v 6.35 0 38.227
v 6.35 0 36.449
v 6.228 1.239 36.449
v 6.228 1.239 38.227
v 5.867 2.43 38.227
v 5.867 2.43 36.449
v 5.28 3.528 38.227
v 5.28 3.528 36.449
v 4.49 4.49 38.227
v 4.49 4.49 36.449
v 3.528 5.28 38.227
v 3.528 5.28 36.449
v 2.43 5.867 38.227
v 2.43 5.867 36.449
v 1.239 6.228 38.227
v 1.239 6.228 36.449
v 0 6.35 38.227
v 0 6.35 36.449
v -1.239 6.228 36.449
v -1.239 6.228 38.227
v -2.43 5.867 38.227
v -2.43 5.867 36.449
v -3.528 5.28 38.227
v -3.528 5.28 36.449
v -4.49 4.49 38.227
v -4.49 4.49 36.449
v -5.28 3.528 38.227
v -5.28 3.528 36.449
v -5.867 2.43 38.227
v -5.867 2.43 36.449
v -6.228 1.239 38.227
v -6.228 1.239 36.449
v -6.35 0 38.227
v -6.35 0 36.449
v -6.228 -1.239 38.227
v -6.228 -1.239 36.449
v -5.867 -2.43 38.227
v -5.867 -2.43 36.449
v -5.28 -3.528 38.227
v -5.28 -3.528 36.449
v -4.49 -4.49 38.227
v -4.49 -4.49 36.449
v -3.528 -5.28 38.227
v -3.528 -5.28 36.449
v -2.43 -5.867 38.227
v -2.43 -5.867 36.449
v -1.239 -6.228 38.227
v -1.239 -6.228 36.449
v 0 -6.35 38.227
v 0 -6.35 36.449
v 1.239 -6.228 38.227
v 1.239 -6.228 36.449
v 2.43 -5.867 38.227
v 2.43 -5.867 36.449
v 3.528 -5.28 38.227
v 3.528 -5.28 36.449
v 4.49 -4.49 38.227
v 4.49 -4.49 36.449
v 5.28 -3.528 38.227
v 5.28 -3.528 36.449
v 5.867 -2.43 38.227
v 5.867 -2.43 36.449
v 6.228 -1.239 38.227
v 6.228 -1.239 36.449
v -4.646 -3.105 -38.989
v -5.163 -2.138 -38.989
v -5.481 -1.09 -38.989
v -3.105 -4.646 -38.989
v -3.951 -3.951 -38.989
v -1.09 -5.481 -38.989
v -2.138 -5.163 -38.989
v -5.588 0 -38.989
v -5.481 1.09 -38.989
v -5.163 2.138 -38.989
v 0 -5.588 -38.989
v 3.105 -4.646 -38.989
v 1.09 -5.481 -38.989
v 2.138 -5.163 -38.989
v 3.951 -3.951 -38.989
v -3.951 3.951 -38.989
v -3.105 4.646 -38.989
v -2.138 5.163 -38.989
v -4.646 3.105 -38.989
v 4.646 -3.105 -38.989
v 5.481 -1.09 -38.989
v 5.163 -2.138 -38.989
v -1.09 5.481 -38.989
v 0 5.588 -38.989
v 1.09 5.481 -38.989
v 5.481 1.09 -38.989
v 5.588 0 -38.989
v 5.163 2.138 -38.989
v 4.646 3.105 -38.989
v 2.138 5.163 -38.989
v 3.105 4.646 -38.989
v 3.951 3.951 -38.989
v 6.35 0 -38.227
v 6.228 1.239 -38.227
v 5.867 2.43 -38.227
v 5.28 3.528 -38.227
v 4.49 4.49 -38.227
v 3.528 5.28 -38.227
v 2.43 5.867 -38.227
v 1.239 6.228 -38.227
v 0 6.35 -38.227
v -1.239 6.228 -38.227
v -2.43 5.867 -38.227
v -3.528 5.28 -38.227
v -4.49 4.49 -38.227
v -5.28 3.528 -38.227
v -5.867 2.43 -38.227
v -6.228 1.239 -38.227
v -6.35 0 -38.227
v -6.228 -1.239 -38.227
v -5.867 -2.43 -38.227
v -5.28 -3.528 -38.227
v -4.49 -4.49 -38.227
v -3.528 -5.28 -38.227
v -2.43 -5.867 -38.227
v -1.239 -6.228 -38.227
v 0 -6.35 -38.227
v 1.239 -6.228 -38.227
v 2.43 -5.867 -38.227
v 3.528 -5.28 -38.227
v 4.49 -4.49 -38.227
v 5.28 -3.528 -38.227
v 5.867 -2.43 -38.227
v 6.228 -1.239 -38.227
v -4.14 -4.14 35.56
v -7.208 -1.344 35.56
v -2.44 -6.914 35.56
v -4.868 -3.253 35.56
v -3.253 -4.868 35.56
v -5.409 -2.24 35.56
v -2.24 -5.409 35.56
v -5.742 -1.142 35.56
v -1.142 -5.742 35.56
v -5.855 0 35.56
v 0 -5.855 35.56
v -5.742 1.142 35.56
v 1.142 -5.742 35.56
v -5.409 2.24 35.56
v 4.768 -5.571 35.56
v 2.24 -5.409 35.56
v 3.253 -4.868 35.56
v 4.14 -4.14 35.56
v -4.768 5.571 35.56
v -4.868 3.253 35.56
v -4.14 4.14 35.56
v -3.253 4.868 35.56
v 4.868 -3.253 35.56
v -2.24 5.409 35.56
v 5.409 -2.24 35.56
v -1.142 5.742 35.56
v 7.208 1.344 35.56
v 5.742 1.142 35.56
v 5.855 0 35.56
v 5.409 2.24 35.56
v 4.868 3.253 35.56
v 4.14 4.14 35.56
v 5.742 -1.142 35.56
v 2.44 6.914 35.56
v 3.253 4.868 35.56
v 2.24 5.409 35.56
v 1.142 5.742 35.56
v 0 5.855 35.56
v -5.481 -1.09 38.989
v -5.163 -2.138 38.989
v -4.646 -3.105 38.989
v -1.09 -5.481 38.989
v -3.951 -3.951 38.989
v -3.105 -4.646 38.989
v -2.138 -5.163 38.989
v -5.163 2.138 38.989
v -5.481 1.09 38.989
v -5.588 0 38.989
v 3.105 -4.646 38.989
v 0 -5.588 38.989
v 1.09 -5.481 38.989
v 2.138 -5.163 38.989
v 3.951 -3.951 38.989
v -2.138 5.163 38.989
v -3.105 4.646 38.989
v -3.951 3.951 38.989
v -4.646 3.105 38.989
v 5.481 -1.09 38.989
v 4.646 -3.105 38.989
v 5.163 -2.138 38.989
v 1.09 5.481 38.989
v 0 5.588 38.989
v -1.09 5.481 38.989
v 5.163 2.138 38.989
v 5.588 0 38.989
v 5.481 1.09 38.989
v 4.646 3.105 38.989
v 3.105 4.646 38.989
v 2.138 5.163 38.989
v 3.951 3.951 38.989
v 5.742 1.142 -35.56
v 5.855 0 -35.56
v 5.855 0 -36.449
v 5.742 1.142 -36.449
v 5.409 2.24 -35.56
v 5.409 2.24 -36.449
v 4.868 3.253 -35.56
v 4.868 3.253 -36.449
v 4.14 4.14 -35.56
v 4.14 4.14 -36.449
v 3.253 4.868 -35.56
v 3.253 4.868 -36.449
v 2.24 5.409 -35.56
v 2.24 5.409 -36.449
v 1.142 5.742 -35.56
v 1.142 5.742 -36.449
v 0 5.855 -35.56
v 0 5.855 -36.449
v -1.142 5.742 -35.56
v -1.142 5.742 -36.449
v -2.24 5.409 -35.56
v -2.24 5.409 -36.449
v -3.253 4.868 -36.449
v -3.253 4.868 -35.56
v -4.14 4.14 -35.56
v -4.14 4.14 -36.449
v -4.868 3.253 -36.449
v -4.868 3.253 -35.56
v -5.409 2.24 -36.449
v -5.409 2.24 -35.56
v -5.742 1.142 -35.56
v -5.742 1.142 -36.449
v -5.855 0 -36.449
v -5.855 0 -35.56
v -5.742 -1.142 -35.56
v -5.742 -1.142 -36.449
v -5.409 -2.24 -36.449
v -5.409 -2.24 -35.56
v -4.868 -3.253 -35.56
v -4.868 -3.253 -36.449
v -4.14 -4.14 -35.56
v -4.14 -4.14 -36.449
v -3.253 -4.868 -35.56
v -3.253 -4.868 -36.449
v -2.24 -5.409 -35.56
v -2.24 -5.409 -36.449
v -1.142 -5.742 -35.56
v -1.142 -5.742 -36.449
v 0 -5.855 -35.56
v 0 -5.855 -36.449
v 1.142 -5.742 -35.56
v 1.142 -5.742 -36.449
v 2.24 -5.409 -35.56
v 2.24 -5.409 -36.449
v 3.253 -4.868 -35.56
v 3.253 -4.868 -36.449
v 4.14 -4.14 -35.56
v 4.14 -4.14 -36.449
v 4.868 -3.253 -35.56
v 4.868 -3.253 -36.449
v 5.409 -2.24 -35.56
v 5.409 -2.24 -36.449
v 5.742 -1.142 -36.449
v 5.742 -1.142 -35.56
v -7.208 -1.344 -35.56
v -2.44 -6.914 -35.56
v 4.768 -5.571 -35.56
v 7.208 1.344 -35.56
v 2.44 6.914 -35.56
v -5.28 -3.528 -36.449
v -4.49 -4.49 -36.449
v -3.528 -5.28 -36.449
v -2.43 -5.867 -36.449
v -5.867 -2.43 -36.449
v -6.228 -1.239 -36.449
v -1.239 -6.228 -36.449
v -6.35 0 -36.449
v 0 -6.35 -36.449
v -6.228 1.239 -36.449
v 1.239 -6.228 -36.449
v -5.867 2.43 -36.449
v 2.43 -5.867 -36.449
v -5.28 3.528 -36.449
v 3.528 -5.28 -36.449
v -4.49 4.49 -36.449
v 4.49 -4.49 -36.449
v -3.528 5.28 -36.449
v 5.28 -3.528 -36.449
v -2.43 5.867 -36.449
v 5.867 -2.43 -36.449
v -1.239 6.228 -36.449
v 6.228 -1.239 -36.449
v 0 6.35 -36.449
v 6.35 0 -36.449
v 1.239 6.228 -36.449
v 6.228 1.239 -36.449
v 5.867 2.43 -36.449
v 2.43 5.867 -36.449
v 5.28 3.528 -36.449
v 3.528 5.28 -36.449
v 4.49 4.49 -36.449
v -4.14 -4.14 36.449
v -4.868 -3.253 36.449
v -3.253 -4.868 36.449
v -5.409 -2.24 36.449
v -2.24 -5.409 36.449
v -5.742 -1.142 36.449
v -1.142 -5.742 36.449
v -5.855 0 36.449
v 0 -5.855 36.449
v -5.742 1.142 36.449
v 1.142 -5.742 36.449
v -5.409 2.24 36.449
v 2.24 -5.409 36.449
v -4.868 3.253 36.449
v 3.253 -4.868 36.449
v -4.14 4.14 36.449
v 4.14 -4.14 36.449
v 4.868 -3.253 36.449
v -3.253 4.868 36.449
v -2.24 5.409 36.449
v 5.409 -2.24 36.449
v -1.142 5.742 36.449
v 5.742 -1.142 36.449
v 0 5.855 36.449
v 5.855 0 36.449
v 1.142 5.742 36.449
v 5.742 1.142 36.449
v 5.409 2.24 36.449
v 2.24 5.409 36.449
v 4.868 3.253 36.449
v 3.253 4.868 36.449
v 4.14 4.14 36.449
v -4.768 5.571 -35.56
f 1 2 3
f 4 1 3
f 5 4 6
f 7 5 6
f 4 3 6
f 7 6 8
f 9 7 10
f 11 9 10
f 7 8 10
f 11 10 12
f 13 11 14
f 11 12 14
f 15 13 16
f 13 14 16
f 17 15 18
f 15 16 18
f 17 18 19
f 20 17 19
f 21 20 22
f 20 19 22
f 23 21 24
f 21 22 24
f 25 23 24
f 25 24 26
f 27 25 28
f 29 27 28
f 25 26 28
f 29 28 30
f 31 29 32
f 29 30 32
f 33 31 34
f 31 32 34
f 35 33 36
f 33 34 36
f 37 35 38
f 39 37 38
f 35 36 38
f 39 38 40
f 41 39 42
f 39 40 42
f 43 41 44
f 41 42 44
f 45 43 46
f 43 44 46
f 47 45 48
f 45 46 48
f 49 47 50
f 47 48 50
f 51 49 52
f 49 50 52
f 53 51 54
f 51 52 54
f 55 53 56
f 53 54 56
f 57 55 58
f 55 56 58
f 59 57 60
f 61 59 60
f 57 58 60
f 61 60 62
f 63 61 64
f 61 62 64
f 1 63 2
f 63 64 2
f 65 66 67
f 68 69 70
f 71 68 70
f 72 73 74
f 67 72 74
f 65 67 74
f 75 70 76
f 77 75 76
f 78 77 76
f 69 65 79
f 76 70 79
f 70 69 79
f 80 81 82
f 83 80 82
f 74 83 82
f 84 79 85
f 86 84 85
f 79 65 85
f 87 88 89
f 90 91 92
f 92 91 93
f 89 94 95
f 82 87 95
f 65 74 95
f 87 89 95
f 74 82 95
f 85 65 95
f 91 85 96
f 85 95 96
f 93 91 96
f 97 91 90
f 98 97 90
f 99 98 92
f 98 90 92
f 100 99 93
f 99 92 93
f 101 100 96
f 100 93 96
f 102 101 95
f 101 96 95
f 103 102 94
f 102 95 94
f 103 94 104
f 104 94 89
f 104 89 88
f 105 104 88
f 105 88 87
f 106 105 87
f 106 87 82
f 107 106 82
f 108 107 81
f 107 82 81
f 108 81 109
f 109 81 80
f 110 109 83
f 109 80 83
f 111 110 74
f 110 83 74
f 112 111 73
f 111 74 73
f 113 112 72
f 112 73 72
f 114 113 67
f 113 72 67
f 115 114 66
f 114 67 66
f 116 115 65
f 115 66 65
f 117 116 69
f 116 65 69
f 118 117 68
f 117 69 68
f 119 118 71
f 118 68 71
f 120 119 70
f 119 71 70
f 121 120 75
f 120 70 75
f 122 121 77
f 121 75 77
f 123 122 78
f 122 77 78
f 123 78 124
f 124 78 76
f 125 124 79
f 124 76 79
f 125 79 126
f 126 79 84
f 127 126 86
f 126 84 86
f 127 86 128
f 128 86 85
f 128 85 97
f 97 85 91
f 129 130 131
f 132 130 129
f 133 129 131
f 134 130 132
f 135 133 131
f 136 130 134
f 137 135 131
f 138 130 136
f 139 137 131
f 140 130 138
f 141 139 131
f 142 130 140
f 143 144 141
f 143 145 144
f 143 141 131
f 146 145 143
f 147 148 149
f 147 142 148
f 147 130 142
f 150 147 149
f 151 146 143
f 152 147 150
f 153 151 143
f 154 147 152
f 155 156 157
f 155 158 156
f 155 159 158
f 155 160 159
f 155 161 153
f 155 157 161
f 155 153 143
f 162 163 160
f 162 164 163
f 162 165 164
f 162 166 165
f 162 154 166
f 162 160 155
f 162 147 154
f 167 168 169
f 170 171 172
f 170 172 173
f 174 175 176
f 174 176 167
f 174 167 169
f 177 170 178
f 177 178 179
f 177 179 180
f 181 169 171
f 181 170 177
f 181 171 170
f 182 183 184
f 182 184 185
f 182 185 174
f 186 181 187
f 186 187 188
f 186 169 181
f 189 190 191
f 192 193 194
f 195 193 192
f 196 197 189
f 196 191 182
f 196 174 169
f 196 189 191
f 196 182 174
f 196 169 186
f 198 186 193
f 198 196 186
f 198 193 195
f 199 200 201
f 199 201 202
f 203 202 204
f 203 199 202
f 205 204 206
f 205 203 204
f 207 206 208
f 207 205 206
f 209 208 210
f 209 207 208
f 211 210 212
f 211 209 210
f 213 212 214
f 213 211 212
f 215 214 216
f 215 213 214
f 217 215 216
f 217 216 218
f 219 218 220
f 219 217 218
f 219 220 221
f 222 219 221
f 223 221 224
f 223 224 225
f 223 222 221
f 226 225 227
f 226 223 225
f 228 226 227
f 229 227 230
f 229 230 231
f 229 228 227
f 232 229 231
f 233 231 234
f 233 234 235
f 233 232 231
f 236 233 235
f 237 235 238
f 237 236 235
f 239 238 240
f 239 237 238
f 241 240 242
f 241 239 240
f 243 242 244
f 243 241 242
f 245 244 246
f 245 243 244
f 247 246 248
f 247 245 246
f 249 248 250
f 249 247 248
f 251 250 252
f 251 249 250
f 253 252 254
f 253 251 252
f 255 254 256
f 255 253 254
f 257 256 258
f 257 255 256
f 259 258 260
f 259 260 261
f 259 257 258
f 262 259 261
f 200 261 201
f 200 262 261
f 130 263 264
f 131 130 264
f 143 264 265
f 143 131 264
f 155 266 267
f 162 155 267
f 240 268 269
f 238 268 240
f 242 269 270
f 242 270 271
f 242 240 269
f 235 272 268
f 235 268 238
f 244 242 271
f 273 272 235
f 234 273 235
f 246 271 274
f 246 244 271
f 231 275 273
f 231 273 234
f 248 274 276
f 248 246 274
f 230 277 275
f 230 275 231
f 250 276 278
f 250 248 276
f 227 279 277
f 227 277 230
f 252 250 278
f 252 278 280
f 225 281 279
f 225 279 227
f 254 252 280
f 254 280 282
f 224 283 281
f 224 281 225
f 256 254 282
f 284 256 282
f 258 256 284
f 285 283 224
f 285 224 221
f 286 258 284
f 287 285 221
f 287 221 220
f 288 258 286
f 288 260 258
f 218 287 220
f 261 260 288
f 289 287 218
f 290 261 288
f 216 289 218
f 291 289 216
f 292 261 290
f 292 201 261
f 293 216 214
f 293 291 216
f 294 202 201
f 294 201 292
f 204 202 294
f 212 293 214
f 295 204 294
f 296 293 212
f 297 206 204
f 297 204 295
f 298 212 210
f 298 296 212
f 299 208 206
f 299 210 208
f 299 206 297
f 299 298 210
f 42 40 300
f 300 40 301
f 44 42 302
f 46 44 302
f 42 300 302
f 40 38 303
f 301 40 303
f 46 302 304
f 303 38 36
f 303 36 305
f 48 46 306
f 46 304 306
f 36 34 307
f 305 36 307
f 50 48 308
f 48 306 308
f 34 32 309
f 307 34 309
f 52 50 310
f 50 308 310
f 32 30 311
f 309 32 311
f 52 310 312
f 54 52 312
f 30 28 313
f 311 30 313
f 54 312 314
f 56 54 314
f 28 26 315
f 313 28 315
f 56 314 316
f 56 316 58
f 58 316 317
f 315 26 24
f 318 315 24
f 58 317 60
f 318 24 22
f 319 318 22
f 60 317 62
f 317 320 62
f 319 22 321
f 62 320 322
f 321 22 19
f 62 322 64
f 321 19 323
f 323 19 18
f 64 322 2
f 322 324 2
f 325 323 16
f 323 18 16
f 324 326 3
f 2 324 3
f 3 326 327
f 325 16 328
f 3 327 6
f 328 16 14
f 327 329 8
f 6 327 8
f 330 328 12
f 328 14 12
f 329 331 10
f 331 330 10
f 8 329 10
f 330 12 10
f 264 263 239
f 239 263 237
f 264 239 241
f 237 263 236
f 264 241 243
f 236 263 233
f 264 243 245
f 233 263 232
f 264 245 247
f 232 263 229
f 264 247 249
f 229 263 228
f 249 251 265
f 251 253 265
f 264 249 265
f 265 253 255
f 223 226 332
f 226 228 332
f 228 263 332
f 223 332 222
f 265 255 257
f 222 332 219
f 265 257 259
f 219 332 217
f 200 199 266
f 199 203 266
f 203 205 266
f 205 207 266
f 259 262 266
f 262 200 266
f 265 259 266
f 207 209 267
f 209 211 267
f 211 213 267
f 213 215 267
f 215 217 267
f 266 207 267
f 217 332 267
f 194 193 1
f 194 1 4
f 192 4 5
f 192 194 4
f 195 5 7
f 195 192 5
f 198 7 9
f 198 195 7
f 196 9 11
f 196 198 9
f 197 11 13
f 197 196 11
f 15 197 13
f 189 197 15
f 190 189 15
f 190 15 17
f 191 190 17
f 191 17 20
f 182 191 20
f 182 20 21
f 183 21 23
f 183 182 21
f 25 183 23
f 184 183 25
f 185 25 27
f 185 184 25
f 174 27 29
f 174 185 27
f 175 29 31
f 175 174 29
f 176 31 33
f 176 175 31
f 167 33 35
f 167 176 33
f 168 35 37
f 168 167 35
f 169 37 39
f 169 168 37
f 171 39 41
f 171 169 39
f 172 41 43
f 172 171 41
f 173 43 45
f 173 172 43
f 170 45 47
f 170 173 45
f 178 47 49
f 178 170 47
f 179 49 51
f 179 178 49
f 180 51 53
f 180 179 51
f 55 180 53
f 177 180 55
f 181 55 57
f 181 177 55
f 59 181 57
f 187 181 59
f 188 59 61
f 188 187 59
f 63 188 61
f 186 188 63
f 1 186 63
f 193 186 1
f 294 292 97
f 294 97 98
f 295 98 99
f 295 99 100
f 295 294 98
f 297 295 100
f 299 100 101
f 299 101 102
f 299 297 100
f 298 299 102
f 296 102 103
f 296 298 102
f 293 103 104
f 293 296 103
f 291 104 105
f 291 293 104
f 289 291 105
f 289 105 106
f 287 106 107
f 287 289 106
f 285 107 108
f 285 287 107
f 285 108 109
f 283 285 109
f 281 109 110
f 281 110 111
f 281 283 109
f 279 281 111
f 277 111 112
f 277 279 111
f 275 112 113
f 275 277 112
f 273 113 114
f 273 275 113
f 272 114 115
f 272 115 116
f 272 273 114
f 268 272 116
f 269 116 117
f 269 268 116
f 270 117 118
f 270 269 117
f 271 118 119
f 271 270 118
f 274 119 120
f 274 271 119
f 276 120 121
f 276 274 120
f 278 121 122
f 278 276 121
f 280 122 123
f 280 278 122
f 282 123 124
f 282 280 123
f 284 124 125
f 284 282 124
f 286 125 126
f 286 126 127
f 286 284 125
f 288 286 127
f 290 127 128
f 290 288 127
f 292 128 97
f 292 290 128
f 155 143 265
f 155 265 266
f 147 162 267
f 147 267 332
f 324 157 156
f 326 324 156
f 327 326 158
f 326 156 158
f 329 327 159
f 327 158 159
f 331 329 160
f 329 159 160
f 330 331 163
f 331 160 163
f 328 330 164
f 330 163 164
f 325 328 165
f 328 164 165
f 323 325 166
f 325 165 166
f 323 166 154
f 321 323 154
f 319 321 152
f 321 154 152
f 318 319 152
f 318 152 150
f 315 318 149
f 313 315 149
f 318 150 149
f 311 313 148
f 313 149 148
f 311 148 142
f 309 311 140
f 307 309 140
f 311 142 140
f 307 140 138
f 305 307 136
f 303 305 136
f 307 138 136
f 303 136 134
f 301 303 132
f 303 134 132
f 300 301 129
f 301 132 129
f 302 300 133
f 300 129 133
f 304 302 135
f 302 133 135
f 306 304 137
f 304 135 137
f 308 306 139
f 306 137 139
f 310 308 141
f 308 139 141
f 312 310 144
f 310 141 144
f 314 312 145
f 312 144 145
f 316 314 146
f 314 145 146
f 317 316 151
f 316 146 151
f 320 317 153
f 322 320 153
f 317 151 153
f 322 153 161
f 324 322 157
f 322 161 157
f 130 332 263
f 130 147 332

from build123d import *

# Parameters (mm, degrees)
BOSS_EXTRUDE1_DEPTH      = 35.56
SKETCH2_R                = 5.8547
BOSS_EXTRUDE2_DEPTH      = 0.889
SKETCH3_R                = 6.35
BOSS_EXTRUDE3_DEPTH      = 2.54
CHAMFER1_SIZE            = 0.762
CHAMFER1_OF_MIRROR1_SIZE = 0.762


with BuildPart() as part:
    # Sketch1 → Boss-Extrude1 (new, symmetric)
    with BuildSketch(Plane.XY):
        Polygon((-2.440353064, -6.914333681), (4.767812086, -5.570574588), (7.20816515, 1.343759093), (2.440353064, 6.914333681), (-4.767812086, 5.570574588), (-7.20816515, -1.343759093), align=None)
    extrude(amount=BOSS_EXTRUDE1_DEPTH, both=True)

    # Sketch2 → Boss-Extrude2 (add)
    with BuildSketch(Plane.XY.offset(35.56)):
        Circle(SKETCH2_R)
    boss_extrude2 = extrude(amount=BOSS_EXTRUDE2_DEPTH)

    # Sketch3 → Boss-Extrude3 (add)
    with BuildSketch(Plane.XY.offset(36.449)):
        Circle(SKETCH3_R)
    boss_extrude3 = extrude(amount=BOSS_EXTRUDE3_DEPTH)

    # Chamfer1
    chamfer1_edges = [part.edges().sort_by_distance(p)[0] for p in [
        (-6.35, 0, 38.989),
    ]]
    chamfer(chamfer1_edges, length=CHAMFER1_SIZE)

    # Mirror1: Boss-Extrude2, Boss-Extrude3 across plane
    add(boss_extrude2.mirror(Plane.XY))
    add(boss_extrude3.mirror(Plane.XY))

    # Chamfer1 of Mirror1
    chamfer1_of_mirror1_edges = [part.edges().sort_by_distance(p)[0] for p in [
        (-6.35, 0, -38.989),
    ]]
    chamfer(chamfer1_of_mirror1_edges, length=CHAMFER1_OF_MIRROR1_SIZE)


solid = part.part
